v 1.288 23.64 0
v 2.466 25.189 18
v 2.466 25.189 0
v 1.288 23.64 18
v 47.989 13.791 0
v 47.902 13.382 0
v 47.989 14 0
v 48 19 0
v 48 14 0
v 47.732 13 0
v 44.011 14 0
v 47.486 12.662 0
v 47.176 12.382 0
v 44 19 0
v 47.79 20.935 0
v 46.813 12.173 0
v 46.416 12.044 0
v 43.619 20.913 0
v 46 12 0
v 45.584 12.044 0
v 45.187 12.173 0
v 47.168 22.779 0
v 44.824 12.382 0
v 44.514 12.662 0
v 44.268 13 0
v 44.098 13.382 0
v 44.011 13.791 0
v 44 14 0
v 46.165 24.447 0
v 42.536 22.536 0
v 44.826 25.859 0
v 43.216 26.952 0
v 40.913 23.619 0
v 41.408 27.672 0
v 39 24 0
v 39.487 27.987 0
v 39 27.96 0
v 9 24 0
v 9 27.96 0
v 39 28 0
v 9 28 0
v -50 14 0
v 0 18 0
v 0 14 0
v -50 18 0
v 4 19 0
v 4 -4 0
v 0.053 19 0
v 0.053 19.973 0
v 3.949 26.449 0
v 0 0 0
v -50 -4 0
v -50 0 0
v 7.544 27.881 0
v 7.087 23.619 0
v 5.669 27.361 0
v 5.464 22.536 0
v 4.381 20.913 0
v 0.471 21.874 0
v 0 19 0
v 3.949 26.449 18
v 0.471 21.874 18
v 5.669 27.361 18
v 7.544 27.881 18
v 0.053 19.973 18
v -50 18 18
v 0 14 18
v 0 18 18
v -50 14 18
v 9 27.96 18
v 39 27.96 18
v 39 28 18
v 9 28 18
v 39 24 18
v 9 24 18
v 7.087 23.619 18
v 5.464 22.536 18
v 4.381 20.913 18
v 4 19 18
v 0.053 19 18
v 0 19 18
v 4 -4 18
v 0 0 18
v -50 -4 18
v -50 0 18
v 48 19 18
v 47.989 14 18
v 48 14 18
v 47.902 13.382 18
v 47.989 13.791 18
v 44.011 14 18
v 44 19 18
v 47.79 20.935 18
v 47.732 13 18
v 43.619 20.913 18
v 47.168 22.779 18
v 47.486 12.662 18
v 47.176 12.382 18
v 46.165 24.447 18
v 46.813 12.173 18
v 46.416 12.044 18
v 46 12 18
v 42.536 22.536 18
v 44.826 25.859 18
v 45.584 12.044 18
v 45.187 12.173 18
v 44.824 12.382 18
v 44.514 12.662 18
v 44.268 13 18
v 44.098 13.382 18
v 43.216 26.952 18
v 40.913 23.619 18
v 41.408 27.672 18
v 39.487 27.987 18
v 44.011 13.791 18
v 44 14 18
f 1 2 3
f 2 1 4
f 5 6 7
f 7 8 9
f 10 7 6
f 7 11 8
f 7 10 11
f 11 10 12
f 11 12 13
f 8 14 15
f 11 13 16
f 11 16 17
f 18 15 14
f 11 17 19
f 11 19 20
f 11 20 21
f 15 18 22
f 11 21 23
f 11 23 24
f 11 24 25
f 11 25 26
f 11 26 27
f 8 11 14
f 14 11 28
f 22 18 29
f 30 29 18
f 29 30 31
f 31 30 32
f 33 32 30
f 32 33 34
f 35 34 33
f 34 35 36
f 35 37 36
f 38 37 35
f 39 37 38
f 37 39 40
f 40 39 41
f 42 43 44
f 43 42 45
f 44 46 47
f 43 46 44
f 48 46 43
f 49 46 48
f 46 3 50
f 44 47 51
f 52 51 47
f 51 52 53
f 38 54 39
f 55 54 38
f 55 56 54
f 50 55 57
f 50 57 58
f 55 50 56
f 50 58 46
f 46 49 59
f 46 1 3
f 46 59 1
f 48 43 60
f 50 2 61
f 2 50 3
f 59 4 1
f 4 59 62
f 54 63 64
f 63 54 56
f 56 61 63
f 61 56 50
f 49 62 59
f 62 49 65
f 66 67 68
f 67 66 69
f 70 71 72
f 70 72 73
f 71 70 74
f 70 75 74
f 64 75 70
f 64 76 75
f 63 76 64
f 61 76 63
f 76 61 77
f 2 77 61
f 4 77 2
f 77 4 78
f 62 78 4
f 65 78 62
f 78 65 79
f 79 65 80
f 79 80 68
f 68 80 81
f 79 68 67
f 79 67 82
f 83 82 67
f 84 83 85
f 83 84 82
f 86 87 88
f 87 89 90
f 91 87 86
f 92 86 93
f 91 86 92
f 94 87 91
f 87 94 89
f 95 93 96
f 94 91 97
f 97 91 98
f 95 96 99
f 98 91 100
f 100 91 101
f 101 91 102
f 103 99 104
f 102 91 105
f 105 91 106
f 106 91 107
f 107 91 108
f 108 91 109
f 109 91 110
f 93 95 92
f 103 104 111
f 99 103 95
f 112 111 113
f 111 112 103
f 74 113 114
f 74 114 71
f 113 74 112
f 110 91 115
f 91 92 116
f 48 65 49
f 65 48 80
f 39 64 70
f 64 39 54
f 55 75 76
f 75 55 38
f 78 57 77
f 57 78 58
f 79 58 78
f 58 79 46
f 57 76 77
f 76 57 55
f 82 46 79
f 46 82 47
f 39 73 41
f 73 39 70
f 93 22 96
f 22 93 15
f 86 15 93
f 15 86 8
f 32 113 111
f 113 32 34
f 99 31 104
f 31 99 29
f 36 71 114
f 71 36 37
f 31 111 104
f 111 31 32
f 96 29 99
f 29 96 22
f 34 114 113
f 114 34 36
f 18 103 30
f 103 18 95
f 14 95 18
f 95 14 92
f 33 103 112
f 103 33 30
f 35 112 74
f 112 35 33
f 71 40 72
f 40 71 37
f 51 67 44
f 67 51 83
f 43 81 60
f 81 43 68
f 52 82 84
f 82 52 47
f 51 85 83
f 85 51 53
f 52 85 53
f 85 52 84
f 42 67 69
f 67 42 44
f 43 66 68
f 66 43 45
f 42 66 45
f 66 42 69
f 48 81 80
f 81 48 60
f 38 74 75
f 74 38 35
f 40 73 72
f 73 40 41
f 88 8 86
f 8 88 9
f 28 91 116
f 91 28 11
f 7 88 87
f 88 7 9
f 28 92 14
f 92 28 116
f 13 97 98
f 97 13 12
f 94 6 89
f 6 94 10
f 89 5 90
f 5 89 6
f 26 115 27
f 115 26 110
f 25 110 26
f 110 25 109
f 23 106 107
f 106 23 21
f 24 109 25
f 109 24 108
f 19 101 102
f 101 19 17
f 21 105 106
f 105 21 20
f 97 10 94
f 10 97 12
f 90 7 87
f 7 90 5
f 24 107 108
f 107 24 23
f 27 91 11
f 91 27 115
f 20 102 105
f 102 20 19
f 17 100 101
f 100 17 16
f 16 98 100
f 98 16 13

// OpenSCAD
// the thickness of the lines as as seen from above (don't recommend much more than 6 or the geometry gets messy)
thickness = 4;

// how high it will protrude from the build plate
width = 18;

// the length of the part that goes onto the shelf
length = 50;

// the shelf thickness
shelf = 18;

// how far it goes down below the bottom of the shelf (should be at least equal to thickness
hang = 5;

// diameter of hook bends
gap = 10;

// vertical part above the hook to prevent slipping off
tip = 5;

// width of the trough of the hook (wide U - positive number vs. semi-circle, 0)
trough = 30;

module hook() {
  union() {
    // the part above the shelf
    translate([-length, 0, 0])
    cube([length, width, thickness]);

	 // the part below the shelf
    translate([-length, 0, -shelf])
	 cube([length, width, thickness]);

    // the part that goes down to the hook
    translate([0, 0, -shelf-hang+thickness])
    cube([thickness, width, hang+shelf]);

    // the first round part of the hook
    difference() {
      // a big cylinder
      translate([thickness+gap/2, 0, -shelf-hang+thickness])
      rotate([270, 0, 0])
      cylinder(h=width, d=gap+2*thickness);

      // minus a smaller cylinder
      translate([gap/2+thickness, -.1, -shelf-hang+thickness])
      rotate([270, 0, 0])
      cylinder(h=width+.2, d=gap);

      // minus a cube to turn it into a semicircle
      translate([thickness, -.1, -shelf-hang+thickness])
      cube([gap+(2*thickness)+.1, width+.2, gap+2*thickness]);

		// minus another cube to turn it into a quarter circle
		translate([gap/2+thickness, -0.1, -shelf-hang-gap/2-thickness])
		cube([gap+2*thickness, width+thickness, gap+2*thickness]);
    }



    // the second round part of the hook
    
    difference() {
      // a big cylinder
      translate([trough+thickness+gap/2, 0, -shelf-hang+thickness])
      rotate([270, 0, 0])
      cylinder(h=width, d=gap+2*thickness);

      // minus a smaller cylinder
      translate([gap/2+thickness+trough, -.1, -shelf-hang+thickness])
      rotate([270, 0, 0])
      cylinder(h=width+.2, d=gap);

      // minus a cube to turn it into a semicircle
      translate([trough, -.1, -shelf-hang+thickness])
      cube([gap+(2*thickness), width+.2, gap+(2*thickness)]);

		// minus another cube to turn it into a quarter circle
		translate([trough-gap/2+thickness, -0.1, -shelf-hang-gap+thickness])
		cube([gap, width+.2, gap+2*thickness]);
    }

	 // add a bar between the two curves
	 translate([gap/2+thickness,0,-shelf-hang-gap/2])
	 cube([trough,width,thickness]);

    // add a vertical tip above the hook
    translate([thickness+gap+trough, 0, -shelf-hang+thickness])
    cube([thickness, width, tip]);

    // add a rounded tip to the hook
    translate([thickness*1.5+gap+trough, width, -shelf-hang+tip+thickness])
	 rotate([90,90,0])
    cylinder(h=width, r=thickness/2, $fs=.1);
  }
}

// comment out the rotate below before making changes to above, 
// for sanity sake
rotate([90, 0, 0])
hook();
